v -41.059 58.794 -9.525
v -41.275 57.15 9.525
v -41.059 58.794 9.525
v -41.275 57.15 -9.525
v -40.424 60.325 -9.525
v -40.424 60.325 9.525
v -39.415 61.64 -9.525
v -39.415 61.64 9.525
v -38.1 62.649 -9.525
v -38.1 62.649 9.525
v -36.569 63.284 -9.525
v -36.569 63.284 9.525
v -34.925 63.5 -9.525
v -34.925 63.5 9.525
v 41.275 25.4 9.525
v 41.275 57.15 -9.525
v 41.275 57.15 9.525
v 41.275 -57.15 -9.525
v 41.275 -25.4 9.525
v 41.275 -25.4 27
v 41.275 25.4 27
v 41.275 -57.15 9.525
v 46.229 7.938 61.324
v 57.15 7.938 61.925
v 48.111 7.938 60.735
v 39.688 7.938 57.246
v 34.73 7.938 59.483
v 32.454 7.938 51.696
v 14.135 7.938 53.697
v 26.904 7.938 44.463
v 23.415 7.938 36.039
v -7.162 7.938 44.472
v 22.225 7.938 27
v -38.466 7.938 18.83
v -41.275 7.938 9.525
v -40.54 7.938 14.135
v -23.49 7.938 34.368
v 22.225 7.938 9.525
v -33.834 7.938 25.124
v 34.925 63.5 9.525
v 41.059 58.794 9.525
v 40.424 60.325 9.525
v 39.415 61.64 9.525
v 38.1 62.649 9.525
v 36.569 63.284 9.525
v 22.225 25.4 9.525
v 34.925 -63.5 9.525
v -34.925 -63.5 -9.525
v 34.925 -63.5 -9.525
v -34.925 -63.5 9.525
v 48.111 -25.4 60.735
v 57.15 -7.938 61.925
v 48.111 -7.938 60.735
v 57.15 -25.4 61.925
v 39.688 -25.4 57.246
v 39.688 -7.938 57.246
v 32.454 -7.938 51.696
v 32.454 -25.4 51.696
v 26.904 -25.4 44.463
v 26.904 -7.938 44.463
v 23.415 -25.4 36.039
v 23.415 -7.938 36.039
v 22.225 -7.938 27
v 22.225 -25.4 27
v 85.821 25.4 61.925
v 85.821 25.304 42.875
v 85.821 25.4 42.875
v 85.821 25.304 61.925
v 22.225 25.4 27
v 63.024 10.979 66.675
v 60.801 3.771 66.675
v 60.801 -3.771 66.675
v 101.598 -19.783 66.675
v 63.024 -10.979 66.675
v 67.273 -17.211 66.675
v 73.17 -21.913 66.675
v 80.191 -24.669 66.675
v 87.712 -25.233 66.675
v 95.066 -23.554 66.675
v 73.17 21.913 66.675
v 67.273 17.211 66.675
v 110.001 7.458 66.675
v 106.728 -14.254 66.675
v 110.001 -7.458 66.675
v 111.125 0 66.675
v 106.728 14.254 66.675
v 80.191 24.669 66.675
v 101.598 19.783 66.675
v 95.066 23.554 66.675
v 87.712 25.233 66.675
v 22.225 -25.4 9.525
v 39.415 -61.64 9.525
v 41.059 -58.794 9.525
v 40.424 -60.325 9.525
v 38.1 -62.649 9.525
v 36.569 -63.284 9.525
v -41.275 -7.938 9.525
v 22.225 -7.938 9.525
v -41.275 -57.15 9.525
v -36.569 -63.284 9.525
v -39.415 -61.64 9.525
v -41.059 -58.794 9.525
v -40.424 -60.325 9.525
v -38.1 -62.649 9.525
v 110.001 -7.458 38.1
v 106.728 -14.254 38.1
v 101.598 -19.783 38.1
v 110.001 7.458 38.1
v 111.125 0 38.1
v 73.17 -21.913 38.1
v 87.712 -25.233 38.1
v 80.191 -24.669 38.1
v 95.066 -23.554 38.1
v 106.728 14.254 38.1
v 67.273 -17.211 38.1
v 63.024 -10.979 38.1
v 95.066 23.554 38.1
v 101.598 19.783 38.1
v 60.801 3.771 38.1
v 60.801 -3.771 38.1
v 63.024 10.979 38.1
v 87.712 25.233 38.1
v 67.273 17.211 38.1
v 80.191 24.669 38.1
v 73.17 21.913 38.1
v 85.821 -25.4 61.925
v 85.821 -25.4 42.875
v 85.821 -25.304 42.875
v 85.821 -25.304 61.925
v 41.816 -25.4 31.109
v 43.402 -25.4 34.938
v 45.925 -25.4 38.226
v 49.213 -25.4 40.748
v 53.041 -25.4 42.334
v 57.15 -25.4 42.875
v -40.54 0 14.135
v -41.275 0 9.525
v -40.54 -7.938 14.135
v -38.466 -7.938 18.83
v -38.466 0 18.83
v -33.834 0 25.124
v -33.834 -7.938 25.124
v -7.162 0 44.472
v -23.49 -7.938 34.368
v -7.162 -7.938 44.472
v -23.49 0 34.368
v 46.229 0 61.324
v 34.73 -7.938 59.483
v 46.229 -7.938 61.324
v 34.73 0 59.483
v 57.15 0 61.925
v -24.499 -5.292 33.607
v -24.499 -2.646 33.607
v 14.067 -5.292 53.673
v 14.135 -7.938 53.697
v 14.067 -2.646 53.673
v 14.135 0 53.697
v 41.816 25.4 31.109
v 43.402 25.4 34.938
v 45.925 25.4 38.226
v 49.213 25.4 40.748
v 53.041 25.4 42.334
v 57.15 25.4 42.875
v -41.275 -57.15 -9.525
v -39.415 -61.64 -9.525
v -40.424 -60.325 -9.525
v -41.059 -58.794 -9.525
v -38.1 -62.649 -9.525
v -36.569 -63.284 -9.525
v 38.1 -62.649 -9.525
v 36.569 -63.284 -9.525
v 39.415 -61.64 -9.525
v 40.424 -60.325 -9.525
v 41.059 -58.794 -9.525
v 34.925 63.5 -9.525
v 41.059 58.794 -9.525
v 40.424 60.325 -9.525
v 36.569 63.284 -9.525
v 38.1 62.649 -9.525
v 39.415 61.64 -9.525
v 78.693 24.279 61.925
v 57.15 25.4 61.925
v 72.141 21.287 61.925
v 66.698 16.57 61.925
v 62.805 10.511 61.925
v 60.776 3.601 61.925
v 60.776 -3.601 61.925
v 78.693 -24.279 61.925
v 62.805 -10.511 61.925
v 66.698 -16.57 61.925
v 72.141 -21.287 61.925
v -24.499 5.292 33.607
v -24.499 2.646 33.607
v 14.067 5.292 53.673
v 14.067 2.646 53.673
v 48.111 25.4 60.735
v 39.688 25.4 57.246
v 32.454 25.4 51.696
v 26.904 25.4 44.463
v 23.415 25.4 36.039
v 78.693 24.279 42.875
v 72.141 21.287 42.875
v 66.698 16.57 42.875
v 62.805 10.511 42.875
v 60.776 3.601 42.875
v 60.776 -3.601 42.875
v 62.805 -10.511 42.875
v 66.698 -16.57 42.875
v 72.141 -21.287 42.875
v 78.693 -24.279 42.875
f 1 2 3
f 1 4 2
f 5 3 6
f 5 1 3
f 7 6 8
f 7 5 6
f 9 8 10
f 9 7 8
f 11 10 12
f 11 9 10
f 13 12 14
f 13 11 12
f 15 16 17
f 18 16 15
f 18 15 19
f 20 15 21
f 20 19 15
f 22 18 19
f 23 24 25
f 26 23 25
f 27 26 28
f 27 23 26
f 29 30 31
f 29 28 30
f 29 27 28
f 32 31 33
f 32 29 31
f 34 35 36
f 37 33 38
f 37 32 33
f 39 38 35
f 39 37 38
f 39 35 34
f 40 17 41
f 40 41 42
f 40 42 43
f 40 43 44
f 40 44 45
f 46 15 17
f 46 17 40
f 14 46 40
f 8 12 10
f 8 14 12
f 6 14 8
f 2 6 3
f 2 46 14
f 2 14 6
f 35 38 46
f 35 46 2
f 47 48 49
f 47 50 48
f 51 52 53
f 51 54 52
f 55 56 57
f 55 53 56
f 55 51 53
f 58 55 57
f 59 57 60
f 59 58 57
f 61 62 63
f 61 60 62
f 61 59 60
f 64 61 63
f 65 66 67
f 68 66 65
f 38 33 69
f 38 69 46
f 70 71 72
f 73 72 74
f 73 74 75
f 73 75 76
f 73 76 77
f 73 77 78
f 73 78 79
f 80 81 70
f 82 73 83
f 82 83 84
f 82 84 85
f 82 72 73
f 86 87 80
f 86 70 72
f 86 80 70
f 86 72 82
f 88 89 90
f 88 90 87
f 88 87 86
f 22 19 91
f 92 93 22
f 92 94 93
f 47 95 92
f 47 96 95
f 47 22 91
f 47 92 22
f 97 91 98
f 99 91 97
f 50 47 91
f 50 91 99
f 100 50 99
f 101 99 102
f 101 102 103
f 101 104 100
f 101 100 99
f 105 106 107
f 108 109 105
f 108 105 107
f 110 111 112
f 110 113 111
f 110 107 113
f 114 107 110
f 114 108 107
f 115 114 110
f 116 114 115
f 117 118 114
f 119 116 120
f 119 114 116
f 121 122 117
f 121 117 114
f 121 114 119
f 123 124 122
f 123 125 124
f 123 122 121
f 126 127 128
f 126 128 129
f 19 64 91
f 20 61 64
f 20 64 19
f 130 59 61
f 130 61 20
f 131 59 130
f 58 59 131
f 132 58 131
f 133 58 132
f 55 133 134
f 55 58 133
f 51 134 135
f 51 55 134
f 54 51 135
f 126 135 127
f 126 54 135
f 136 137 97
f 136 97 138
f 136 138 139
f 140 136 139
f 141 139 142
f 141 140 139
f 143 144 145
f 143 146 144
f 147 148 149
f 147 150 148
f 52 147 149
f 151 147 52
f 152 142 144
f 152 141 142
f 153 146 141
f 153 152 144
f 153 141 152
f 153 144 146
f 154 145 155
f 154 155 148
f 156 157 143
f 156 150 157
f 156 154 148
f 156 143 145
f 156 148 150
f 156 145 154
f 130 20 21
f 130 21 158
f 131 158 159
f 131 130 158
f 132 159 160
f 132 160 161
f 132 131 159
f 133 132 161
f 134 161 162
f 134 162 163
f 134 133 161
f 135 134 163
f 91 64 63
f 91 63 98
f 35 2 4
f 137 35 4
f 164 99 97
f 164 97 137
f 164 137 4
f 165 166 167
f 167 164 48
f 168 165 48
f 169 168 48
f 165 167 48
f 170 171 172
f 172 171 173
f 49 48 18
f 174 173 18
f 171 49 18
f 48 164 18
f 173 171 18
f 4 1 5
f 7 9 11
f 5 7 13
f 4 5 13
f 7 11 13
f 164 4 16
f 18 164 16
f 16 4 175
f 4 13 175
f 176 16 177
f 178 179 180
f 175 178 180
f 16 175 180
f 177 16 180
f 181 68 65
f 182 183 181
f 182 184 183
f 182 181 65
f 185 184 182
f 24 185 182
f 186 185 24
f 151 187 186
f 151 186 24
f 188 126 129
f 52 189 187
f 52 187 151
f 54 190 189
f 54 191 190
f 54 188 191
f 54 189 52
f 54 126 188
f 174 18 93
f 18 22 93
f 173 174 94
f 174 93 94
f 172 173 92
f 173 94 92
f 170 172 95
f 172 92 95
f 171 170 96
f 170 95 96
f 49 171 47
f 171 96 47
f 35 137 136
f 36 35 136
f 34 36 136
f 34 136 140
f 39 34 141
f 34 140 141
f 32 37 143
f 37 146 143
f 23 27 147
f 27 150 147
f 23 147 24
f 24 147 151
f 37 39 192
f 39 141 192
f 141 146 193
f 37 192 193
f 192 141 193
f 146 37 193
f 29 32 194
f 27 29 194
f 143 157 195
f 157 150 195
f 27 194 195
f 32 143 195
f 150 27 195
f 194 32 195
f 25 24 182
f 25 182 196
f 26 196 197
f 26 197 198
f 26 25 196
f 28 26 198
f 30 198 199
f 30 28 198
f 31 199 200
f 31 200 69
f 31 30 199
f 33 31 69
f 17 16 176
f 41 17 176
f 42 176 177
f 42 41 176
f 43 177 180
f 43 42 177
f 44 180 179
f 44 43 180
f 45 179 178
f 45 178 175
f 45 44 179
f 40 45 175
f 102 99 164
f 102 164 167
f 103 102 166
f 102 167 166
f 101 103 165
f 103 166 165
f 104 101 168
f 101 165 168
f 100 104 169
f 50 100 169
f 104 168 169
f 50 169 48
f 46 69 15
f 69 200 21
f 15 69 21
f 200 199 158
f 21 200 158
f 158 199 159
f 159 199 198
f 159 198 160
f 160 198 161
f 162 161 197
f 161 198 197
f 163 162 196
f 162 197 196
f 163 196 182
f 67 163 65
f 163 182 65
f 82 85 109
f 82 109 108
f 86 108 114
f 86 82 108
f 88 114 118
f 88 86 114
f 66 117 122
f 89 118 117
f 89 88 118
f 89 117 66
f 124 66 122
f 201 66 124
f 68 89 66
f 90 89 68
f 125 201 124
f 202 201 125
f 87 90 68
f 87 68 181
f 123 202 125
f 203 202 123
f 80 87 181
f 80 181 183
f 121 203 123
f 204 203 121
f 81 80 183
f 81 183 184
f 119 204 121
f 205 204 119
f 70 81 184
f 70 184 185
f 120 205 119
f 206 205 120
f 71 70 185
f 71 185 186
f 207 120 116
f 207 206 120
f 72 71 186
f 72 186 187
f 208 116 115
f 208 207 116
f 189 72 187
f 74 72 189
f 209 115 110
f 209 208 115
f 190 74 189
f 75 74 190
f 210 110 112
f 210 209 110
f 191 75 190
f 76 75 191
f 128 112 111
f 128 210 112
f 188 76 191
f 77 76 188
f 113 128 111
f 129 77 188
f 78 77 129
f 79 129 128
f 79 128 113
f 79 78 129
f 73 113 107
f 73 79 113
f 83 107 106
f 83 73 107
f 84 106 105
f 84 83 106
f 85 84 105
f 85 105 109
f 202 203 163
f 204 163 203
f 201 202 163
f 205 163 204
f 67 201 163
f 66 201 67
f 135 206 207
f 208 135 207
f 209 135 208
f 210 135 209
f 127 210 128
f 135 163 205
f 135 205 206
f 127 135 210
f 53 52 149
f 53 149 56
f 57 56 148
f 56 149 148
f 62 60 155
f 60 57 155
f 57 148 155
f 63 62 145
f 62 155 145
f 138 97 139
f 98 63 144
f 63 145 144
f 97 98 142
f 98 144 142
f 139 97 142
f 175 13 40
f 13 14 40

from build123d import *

# Parameters (mm, degrees)
F1_DEPTH = 63.5
F0_W     = 25.4964783202
F0_H     = 19.05
F2_DEPTH = 25.4
F3_DEPTH = 7.9375
F4_DEPTH = 25.4
F6_R     = 6.35


with BuildPart() as f1:
    # F0 (on Front) → F1 (new body, symmetric)
    with BuildSketch(Plane.XZ):
        Polygon((-41.275, -9.525), (41.275, -9.525), (41.275, 9.525), (22.225, 9.525), (-41.275, 9.525), align=None)
    extrude(amount=F1_DEPTH, both=True)

    # F0 (on Front) → F2 (join, symmetric)
    with BuildSketch(Plane.XZ):
        with BuildLine():
            Line((22.225, 9.525), (41.275, 9.525))
            Line((41.275, 9.525), (41.275, 27.0002))
            ThreePointArc((41.275, 27.0002), (45.9246798487, 38.2255201513), (57.15, 42.8752))
            Line((57.15, 42.8752), (60.325, 42.8752))
            Line((60.325, 42.8752), (60.325, 61.9252))
            Line((60.325, 61.9252), (57.15, 61.9252))
            ThreePointArc((57.15, 61.9252), (32.4542956671, 51.6959043329), (22.225, 27.0002))
            Line((22.225, 27.0002), (22.225, 9.525))
        make_face()
        with Locations((73.0732391601, 52.4002)):
            Rectangle(F0_W, F0_H)
    extrude(amount=F2_DEPTH, both=True)

    # F0 (on Front) → F3 (join, symmetric)
    with BuildSketch(Plane.XZ):
        with BuildLine():
            add(Edge.make_bspline(
                [(-41.275, 9.525), (-41.1518029869, 33.0162532628), (17.5662990659, 62.1782578528), (57.15, 61.9252)],
                knots=[0, 0, 0, 0, 111.5045361635, 111.5045361635, 111.5045361635, 111.5045361635], degree=3))
            Line((-41.275, 9.525), (22.225, 9.525))
            Line((22.225, 9.525), (22.225, 27.0002))
            ThreePointArc((22.225, 27.0002), (32.4542956671, 51.6959043329), (57.15, 61.9252))
        make_face()
    extrude(amount=F3_DEPTH, both=True)

    # F0 (on Front) → F4 (join)
    with BuildSketch(Plane.XZ):
        Polygon((-41.275, -9.525), (41.275, -9.525), (41.275, 9.525), (22.225, 9.525), (-41.275, 9.525), align=None)
    extrude(amount=F4_DEPTH)

    # F0 (on Front) → F5 (revolve)
    with BuildSketch(Plane.XZ):
        Polygon((85.8214783202, 66.675), (85.8214783202, 61.9252), (85.8214783202, 42.8752), (85.8214783202, 38.1), (111.125, 38.1), (111.125, 66.675), align=None)
    revolve(axis=Axis((85.8214783202, 0, 52.3875), (0, 0, 1)))

    # F6
    f6_edges = [f1.edges().sort_by_distance(p)[0] for p in [
        (-41.275, -63.5, 0),
        (41.275, -63.5, 0),
        (-41.275, 63.5, 0),
        (41.275, 63.5, 0),
    ]]
    fillet(f6_edges, radius=F6_R)


solid = f1.part
